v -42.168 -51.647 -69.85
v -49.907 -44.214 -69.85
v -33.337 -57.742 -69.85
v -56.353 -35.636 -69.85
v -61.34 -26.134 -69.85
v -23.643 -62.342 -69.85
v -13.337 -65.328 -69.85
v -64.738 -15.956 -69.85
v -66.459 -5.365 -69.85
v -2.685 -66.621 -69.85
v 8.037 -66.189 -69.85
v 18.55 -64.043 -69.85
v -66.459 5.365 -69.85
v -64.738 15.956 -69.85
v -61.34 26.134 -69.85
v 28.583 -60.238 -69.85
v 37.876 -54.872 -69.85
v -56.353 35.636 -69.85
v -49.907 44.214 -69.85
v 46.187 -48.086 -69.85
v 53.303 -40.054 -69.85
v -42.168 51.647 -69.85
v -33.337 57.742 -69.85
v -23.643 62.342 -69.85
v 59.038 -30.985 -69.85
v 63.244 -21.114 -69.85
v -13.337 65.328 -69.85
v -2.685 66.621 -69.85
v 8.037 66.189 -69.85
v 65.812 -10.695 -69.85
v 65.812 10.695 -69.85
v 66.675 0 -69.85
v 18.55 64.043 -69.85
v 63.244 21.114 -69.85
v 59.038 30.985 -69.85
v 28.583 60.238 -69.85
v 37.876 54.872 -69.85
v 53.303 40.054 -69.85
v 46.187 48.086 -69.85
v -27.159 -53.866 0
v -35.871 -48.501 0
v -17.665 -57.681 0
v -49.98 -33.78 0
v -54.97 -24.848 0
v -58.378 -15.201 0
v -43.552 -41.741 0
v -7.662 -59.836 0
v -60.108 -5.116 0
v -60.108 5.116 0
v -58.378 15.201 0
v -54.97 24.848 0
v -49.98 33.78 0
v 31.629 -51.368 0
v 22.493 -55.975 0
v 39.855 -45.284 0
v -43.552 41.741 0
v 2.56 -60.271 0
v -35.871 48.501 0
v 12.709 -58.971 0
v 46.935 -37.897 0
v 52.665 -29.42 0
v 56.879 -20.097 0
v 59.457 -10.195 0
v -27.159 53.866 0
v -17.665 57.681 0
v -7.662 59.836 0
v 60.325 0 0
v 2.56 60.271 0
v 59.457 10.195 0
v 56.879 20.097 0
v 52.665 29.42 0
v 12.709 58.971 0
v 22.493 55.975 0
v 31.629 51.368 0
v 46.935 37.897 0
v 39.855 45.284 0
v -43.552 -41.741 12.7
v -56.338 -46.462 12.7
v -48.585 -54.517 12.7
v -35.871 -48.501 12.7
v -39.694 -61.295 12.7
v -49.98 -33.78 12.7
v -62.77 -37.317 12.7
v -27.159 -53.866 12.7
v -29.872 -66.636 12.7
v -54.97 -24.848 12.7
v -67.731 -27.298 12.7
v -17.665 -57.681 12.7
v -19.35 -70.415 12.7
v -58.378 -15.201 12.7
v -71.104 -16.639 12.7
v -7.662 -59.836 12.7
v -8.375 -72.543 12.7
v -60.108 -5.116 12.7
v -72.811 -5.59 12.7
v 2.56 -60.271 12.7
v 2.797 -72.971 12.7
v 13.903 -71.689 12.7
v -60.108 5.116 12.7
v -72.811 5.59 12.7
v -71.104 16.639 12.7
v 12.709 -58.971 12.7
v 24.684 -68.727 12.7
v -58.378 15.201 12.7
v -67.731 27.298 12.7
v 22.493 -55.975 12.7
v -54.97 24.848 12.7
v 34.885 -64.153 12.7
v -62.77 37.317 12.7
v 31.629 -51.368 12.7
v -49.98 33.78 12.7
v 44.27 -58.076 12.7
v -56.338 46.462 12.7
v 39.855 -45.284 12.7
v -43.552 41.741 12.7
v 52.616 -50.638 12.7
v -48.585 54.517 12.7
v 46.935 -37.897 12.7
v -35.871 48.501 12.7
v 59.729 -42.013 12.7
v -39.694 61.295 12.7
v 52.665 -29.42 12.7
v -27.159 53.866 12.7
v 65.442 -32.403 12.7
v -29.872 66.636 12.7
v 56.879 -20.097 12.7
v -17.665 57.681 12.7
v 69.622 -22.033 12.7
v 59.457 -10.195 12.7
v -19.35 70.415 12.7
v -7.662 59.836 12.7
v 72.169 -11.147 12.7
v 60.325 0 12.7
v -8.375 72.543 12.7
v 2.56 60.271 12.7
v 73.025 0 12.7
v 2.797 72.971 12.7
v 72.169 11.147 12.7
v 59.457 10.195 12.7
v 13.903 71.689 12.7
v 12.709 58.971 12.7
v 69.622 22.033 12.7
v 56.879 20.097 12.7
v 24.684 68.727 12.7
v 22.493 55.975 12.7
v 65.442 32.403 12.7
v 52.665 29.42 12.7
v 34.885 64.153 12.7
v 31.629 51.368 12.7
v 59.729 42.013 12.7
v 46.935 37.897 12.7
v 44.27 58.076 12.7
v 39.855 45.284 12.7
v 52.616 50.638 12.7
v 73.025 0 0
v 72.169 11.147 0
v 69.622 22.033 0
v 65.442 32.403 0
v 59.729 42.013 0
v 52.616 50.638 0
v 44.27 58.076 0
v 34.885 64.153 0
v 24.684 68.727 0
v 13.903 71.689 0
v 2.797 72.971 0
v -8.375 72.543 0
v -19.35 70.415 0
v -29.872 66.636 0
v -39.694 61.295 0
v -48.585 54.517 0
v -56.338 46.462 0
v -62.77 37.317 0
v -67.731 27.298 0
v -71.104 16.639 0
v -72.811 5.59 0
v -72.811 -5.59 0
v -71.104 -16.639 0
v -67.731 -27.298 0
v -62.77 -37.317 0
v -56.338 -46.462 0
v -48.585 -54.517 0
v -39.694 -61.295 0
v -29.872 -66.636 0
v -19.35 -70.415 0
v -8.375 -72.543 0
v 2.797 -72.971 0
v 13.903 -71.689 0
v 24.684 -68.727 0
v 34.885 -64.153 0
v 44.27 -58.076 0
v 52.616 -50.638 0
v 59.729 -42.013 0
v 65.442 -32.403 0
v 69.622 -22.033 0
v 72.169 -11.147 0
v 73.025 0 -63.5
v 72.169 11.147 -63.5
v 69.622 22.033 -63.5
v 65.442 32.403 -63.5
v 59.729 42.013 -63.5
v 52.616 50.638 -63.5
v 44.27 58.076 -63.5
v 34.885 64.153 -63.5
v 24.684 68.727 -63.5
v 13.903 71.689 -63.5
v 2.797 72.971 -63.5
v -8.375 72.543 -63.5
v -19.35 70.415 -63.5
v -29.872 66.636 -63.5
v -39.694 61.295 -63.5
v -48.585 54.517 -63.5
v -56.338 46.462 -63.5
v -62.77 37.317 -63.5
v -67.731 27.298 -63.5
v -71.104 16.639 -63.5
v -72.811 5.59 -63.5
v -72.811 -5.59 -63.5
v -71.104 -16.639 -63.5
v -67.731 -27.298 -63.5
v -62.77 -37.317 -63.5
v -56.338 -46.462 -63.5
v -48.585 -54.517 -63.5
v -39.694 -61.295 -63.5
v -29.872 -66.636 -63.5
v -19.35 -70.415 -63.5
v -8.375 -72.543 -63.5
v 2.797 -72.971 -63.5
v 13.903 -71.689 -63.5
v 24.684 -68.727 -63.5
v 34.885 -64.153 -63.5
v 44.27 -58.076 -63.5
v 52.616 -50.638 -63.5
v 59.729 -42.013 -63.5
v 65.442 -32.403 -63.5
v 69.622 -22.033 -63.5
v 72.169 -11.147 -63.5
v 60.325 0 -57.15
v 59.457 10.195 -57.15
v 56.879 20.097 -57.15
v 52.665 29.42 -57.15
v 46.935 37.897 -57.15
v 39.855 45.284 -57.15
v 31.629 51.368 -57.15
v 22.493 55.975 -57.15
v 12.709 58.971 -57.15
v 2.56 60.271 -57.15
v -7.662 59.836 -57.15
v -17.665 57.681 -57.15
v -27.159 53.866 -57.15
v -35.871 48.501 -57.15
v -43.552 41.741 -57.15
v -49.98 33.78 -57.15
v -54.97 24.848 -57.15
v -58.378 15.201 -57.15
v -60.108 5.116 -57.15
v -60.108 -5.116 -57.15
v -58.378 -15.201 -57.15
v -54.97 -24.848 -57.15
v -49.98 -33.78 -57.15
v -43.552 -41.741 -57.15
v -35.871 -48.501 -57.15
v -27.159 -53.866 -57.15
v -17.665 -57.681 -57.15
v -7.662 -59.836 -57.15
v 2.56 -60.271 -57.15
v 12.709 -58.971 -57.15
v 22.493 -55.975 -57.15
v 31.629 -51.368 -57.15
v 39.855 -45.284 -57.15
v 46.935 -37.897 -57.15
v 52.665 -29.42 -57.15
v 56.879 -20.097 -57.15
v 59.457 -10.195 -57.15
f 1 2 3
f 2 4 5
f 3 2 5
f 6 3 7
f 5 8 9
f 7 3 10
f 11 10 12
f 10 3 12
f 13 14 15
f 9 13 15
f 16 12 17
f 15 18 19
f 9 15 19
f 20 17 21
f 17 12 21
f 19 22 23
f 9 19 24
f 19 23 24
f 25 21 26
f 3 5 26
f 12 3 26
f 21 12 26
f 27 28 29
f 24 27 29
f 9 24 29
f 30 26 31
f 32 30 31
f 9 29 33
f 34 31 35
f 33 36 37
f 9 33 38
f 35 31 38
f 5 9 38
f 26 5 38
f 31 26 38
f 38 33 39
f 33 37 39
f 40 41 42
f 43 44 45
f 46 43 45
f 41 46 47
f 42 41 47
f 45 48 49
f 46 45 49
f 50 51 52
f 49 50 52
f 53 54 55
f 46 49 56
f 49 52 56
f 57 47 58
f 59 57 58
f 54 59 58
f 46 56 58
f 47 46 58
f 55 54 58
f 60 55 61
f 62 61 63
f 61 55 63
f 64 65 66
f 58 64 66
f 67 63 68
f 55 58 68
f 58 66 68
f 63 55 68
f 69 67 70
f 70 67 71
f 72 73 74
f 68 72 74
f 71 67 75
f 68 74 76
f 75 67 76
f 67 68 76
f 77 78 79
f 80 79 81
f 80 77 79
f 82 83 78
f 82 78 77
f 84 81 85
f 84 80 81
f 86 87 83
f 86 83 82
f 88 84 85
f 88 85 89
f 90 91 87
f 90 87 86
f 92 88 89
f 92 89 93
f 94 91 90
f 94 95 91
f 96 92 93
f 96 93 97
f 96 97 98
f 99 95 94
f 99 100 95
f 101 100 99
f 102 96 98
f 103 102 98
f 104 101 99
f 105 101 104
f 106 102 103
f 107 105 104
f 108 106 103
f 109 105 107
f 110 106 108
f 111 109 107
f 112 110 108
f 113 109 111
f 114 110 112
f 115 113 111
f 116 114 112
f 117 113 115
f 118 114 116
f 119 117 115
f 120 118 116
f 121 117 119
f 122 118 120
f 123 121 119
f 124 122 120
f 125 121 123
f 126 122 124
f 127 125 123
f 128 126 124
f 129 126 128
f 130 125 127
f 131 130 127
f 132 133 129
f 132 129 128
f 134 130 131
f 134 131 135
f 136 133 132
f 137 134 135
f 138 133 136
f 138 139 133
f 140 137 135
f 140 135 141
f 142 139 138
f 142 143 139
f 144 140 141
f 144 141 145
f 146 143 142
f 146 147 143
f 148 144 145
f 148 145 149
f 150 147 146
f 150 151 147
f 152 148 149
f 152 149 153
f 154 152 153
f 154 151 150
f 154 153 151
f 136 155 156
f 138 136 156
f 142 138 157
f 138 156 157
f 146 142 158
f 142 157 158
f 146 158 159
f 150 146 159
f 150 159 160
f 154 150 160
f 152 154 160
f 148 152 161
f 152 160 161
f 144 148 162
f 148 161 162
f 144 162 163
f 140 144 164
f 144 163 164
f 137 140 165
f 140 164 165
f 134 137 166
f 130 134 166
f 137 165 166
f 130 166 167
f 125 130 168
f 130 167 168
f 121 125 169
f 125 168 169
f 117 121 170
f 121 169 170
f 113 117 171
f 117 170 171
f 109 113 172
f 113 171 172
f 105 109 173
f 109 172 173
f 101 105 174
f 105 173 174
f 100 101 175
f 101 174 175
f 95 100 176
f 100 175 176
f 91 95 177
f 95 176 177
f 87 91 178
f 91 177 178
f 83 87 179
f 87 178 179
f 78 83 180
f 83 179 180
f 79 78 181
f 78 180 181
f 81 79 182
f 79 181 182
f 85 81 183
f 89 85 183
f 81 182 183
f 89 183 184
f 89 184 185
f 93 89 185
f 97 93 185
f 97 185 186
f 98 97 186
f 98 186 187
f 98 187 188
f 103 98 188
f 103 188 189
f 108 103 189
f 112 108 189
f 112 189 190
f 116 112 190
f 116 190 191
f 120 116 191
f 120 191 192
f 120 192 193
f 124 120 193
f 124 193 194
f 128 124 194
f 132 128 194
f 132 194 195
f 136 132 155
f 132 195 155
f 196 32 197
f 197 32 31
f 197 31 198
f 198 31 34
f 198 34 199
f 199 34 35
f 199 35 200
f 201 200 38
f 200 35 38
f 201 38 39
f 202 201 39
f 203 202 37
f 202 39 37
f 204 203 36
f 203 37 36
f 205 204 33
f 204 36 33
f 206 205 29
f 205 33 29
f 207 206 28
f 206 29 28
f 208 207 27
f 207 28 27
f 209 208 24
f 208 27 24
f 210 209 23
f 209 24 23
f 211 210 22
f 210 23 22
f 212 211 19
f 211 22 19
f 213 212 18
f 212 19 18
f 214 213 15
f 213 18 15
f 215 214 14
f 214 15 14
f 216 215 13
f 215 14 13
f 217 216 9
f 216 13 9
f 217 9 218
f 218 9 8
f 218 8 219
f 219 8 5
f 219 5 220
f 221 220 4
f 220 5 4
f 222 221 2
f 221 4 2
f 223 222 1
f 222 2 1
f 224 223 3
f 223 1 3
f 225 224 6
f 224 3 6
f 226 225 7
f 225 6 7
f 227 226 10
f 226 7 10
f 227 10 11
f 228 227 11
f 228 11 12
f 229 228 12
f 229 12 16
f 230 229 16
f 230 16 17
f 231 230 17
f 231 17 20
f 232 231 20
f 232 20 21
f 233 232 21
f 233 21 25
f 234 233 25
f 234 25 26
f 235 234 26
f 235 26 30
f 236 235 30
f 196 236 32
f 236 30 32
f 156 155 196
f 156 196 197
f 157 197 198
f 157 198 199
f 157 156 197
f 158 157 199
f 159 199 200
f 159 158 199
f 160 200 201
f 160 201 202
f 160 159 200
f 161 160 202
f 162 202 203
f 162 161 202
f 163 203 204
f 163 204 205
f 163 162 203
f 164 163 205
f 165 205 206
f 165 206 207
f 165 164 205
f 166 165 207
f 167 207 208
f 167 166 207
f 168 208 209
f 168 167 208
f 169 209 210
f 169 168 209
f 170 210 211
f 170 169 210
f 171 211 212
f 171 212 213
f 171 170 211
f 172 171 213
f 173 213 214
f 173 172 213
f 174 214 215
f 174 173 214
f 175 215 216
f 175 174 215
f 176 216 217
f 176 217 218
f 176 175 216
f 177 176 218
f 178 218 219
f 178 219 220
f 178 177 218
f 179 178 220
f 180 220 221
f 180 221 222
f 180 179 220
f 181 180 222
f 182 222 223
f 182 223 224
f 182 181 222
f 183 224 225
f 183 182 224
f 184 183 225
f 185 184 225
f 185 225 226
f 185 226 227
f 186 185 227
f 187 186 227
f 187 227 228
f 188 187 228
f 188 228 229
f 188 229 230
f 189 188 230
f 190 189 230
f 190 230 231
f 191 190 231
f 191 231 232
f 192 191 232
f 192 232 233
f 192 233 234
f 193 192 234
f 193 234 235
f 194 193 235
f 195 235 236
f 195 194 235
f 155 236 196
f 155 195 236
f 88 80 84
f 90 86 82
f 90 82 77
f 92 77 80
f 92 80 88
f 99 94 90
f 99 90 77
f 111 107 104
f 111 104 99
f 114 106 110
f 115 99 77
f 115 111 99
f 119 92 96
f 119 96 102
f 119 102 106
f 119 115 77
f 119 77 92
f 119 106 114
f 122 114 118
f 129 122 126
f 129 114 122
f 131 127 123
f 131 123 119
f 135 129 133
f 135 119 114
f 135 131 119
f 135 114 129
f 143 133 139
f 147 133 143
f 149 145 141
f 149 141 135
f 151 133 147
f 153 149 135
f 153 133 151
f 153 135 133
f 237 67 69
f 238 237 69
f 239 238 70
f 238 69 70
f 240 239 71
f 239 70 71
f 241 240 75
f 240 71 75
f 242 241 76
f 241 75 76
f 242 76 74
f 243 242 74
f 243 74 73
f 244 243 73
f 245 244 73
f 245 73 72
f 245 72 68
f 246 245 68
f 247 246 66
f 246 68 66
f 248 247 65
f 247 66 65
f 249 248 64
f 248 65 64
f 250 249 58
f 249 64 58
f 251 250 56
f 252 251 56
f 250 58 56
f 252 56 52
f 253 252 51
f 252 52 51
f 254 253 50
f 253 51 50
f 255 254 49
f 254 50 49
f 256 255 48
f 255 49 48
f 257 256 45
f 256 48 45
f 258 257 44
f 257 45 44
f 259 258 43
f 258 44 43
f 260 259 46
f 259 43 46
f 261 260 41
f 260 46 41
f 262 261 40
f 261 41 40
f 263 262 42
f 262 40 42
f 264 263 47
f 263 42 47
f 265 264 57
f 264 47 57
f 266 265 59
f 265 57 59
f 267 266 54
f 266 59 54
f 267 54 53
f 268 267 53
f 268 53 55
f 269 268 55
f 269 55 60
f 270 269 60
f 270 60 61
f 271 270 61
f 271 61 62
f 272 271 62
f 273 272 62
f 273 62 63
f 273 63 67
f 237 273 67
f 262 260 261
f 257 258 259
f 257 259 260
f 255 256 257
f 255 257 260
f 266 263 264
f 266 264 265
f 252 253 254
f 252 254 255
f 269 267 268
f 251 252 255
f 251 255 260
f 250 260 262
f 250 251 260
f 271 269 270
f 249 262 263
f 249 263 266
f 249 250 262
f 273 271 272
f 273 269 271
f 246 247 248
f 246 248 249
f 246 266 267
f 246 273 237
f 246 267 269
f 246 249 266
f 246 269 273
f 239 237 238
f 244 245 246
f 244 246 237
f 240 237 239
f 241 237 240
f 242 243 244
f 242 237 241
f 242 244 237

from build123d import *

# Parameters (mm, degrees)
F0_R      = 73.025
F0_R_2    = 60.325
F1_DEPTH  = 69.85
F2_DEPTH  = 57.15
F3_SIZE   = 6.35
F4_DEPTH  = 12.7
F4_FACE_R = 73.025
F5_DEPTH  = 12.7


with BuildPart() as f1:
    # F0 (on Top) → F1 (new body)
    with BuildSketch(Plane.XY):
        Circle(F0_R)
        Circle(F0_R_2, mode=Mode.SUBTRACT)
        Circle(F0_R_2)
    extrude(amount=-F1_DEPTH)

    # F0 (on Top) → F2 (cut)
    with BuildSketch(Plane.XY):
        Circle(F0_R_2)
    extrude(amount=-F2_DEPTH, mode=Mode.SUBTRACT)

    # F3
    f3_edges = [f1.edges().sort_by_distance(p)[0] for p in [
        (-73.025, 0, -69.85),
    ]]
    chamfer(f3_edges, length=F3_SIZE)

    # F0 (on Top) → F4 (join)
    with BuildSketch(Plane.XY):
        Circle(F0_R_2)
        Circle(F0_R)
        Circle(F0_R_2, mode=Mode.SUBTRACT)
    extrude(amount=F4_DEPTH)

    # F4_face (on face) → F5 (join)
    with BuildSketch(Plane.XY.offset(12.7)):
        Circle(F4_FACE_R)
    extrude(amount=-F5_DEPTH)


solid = f1.part
